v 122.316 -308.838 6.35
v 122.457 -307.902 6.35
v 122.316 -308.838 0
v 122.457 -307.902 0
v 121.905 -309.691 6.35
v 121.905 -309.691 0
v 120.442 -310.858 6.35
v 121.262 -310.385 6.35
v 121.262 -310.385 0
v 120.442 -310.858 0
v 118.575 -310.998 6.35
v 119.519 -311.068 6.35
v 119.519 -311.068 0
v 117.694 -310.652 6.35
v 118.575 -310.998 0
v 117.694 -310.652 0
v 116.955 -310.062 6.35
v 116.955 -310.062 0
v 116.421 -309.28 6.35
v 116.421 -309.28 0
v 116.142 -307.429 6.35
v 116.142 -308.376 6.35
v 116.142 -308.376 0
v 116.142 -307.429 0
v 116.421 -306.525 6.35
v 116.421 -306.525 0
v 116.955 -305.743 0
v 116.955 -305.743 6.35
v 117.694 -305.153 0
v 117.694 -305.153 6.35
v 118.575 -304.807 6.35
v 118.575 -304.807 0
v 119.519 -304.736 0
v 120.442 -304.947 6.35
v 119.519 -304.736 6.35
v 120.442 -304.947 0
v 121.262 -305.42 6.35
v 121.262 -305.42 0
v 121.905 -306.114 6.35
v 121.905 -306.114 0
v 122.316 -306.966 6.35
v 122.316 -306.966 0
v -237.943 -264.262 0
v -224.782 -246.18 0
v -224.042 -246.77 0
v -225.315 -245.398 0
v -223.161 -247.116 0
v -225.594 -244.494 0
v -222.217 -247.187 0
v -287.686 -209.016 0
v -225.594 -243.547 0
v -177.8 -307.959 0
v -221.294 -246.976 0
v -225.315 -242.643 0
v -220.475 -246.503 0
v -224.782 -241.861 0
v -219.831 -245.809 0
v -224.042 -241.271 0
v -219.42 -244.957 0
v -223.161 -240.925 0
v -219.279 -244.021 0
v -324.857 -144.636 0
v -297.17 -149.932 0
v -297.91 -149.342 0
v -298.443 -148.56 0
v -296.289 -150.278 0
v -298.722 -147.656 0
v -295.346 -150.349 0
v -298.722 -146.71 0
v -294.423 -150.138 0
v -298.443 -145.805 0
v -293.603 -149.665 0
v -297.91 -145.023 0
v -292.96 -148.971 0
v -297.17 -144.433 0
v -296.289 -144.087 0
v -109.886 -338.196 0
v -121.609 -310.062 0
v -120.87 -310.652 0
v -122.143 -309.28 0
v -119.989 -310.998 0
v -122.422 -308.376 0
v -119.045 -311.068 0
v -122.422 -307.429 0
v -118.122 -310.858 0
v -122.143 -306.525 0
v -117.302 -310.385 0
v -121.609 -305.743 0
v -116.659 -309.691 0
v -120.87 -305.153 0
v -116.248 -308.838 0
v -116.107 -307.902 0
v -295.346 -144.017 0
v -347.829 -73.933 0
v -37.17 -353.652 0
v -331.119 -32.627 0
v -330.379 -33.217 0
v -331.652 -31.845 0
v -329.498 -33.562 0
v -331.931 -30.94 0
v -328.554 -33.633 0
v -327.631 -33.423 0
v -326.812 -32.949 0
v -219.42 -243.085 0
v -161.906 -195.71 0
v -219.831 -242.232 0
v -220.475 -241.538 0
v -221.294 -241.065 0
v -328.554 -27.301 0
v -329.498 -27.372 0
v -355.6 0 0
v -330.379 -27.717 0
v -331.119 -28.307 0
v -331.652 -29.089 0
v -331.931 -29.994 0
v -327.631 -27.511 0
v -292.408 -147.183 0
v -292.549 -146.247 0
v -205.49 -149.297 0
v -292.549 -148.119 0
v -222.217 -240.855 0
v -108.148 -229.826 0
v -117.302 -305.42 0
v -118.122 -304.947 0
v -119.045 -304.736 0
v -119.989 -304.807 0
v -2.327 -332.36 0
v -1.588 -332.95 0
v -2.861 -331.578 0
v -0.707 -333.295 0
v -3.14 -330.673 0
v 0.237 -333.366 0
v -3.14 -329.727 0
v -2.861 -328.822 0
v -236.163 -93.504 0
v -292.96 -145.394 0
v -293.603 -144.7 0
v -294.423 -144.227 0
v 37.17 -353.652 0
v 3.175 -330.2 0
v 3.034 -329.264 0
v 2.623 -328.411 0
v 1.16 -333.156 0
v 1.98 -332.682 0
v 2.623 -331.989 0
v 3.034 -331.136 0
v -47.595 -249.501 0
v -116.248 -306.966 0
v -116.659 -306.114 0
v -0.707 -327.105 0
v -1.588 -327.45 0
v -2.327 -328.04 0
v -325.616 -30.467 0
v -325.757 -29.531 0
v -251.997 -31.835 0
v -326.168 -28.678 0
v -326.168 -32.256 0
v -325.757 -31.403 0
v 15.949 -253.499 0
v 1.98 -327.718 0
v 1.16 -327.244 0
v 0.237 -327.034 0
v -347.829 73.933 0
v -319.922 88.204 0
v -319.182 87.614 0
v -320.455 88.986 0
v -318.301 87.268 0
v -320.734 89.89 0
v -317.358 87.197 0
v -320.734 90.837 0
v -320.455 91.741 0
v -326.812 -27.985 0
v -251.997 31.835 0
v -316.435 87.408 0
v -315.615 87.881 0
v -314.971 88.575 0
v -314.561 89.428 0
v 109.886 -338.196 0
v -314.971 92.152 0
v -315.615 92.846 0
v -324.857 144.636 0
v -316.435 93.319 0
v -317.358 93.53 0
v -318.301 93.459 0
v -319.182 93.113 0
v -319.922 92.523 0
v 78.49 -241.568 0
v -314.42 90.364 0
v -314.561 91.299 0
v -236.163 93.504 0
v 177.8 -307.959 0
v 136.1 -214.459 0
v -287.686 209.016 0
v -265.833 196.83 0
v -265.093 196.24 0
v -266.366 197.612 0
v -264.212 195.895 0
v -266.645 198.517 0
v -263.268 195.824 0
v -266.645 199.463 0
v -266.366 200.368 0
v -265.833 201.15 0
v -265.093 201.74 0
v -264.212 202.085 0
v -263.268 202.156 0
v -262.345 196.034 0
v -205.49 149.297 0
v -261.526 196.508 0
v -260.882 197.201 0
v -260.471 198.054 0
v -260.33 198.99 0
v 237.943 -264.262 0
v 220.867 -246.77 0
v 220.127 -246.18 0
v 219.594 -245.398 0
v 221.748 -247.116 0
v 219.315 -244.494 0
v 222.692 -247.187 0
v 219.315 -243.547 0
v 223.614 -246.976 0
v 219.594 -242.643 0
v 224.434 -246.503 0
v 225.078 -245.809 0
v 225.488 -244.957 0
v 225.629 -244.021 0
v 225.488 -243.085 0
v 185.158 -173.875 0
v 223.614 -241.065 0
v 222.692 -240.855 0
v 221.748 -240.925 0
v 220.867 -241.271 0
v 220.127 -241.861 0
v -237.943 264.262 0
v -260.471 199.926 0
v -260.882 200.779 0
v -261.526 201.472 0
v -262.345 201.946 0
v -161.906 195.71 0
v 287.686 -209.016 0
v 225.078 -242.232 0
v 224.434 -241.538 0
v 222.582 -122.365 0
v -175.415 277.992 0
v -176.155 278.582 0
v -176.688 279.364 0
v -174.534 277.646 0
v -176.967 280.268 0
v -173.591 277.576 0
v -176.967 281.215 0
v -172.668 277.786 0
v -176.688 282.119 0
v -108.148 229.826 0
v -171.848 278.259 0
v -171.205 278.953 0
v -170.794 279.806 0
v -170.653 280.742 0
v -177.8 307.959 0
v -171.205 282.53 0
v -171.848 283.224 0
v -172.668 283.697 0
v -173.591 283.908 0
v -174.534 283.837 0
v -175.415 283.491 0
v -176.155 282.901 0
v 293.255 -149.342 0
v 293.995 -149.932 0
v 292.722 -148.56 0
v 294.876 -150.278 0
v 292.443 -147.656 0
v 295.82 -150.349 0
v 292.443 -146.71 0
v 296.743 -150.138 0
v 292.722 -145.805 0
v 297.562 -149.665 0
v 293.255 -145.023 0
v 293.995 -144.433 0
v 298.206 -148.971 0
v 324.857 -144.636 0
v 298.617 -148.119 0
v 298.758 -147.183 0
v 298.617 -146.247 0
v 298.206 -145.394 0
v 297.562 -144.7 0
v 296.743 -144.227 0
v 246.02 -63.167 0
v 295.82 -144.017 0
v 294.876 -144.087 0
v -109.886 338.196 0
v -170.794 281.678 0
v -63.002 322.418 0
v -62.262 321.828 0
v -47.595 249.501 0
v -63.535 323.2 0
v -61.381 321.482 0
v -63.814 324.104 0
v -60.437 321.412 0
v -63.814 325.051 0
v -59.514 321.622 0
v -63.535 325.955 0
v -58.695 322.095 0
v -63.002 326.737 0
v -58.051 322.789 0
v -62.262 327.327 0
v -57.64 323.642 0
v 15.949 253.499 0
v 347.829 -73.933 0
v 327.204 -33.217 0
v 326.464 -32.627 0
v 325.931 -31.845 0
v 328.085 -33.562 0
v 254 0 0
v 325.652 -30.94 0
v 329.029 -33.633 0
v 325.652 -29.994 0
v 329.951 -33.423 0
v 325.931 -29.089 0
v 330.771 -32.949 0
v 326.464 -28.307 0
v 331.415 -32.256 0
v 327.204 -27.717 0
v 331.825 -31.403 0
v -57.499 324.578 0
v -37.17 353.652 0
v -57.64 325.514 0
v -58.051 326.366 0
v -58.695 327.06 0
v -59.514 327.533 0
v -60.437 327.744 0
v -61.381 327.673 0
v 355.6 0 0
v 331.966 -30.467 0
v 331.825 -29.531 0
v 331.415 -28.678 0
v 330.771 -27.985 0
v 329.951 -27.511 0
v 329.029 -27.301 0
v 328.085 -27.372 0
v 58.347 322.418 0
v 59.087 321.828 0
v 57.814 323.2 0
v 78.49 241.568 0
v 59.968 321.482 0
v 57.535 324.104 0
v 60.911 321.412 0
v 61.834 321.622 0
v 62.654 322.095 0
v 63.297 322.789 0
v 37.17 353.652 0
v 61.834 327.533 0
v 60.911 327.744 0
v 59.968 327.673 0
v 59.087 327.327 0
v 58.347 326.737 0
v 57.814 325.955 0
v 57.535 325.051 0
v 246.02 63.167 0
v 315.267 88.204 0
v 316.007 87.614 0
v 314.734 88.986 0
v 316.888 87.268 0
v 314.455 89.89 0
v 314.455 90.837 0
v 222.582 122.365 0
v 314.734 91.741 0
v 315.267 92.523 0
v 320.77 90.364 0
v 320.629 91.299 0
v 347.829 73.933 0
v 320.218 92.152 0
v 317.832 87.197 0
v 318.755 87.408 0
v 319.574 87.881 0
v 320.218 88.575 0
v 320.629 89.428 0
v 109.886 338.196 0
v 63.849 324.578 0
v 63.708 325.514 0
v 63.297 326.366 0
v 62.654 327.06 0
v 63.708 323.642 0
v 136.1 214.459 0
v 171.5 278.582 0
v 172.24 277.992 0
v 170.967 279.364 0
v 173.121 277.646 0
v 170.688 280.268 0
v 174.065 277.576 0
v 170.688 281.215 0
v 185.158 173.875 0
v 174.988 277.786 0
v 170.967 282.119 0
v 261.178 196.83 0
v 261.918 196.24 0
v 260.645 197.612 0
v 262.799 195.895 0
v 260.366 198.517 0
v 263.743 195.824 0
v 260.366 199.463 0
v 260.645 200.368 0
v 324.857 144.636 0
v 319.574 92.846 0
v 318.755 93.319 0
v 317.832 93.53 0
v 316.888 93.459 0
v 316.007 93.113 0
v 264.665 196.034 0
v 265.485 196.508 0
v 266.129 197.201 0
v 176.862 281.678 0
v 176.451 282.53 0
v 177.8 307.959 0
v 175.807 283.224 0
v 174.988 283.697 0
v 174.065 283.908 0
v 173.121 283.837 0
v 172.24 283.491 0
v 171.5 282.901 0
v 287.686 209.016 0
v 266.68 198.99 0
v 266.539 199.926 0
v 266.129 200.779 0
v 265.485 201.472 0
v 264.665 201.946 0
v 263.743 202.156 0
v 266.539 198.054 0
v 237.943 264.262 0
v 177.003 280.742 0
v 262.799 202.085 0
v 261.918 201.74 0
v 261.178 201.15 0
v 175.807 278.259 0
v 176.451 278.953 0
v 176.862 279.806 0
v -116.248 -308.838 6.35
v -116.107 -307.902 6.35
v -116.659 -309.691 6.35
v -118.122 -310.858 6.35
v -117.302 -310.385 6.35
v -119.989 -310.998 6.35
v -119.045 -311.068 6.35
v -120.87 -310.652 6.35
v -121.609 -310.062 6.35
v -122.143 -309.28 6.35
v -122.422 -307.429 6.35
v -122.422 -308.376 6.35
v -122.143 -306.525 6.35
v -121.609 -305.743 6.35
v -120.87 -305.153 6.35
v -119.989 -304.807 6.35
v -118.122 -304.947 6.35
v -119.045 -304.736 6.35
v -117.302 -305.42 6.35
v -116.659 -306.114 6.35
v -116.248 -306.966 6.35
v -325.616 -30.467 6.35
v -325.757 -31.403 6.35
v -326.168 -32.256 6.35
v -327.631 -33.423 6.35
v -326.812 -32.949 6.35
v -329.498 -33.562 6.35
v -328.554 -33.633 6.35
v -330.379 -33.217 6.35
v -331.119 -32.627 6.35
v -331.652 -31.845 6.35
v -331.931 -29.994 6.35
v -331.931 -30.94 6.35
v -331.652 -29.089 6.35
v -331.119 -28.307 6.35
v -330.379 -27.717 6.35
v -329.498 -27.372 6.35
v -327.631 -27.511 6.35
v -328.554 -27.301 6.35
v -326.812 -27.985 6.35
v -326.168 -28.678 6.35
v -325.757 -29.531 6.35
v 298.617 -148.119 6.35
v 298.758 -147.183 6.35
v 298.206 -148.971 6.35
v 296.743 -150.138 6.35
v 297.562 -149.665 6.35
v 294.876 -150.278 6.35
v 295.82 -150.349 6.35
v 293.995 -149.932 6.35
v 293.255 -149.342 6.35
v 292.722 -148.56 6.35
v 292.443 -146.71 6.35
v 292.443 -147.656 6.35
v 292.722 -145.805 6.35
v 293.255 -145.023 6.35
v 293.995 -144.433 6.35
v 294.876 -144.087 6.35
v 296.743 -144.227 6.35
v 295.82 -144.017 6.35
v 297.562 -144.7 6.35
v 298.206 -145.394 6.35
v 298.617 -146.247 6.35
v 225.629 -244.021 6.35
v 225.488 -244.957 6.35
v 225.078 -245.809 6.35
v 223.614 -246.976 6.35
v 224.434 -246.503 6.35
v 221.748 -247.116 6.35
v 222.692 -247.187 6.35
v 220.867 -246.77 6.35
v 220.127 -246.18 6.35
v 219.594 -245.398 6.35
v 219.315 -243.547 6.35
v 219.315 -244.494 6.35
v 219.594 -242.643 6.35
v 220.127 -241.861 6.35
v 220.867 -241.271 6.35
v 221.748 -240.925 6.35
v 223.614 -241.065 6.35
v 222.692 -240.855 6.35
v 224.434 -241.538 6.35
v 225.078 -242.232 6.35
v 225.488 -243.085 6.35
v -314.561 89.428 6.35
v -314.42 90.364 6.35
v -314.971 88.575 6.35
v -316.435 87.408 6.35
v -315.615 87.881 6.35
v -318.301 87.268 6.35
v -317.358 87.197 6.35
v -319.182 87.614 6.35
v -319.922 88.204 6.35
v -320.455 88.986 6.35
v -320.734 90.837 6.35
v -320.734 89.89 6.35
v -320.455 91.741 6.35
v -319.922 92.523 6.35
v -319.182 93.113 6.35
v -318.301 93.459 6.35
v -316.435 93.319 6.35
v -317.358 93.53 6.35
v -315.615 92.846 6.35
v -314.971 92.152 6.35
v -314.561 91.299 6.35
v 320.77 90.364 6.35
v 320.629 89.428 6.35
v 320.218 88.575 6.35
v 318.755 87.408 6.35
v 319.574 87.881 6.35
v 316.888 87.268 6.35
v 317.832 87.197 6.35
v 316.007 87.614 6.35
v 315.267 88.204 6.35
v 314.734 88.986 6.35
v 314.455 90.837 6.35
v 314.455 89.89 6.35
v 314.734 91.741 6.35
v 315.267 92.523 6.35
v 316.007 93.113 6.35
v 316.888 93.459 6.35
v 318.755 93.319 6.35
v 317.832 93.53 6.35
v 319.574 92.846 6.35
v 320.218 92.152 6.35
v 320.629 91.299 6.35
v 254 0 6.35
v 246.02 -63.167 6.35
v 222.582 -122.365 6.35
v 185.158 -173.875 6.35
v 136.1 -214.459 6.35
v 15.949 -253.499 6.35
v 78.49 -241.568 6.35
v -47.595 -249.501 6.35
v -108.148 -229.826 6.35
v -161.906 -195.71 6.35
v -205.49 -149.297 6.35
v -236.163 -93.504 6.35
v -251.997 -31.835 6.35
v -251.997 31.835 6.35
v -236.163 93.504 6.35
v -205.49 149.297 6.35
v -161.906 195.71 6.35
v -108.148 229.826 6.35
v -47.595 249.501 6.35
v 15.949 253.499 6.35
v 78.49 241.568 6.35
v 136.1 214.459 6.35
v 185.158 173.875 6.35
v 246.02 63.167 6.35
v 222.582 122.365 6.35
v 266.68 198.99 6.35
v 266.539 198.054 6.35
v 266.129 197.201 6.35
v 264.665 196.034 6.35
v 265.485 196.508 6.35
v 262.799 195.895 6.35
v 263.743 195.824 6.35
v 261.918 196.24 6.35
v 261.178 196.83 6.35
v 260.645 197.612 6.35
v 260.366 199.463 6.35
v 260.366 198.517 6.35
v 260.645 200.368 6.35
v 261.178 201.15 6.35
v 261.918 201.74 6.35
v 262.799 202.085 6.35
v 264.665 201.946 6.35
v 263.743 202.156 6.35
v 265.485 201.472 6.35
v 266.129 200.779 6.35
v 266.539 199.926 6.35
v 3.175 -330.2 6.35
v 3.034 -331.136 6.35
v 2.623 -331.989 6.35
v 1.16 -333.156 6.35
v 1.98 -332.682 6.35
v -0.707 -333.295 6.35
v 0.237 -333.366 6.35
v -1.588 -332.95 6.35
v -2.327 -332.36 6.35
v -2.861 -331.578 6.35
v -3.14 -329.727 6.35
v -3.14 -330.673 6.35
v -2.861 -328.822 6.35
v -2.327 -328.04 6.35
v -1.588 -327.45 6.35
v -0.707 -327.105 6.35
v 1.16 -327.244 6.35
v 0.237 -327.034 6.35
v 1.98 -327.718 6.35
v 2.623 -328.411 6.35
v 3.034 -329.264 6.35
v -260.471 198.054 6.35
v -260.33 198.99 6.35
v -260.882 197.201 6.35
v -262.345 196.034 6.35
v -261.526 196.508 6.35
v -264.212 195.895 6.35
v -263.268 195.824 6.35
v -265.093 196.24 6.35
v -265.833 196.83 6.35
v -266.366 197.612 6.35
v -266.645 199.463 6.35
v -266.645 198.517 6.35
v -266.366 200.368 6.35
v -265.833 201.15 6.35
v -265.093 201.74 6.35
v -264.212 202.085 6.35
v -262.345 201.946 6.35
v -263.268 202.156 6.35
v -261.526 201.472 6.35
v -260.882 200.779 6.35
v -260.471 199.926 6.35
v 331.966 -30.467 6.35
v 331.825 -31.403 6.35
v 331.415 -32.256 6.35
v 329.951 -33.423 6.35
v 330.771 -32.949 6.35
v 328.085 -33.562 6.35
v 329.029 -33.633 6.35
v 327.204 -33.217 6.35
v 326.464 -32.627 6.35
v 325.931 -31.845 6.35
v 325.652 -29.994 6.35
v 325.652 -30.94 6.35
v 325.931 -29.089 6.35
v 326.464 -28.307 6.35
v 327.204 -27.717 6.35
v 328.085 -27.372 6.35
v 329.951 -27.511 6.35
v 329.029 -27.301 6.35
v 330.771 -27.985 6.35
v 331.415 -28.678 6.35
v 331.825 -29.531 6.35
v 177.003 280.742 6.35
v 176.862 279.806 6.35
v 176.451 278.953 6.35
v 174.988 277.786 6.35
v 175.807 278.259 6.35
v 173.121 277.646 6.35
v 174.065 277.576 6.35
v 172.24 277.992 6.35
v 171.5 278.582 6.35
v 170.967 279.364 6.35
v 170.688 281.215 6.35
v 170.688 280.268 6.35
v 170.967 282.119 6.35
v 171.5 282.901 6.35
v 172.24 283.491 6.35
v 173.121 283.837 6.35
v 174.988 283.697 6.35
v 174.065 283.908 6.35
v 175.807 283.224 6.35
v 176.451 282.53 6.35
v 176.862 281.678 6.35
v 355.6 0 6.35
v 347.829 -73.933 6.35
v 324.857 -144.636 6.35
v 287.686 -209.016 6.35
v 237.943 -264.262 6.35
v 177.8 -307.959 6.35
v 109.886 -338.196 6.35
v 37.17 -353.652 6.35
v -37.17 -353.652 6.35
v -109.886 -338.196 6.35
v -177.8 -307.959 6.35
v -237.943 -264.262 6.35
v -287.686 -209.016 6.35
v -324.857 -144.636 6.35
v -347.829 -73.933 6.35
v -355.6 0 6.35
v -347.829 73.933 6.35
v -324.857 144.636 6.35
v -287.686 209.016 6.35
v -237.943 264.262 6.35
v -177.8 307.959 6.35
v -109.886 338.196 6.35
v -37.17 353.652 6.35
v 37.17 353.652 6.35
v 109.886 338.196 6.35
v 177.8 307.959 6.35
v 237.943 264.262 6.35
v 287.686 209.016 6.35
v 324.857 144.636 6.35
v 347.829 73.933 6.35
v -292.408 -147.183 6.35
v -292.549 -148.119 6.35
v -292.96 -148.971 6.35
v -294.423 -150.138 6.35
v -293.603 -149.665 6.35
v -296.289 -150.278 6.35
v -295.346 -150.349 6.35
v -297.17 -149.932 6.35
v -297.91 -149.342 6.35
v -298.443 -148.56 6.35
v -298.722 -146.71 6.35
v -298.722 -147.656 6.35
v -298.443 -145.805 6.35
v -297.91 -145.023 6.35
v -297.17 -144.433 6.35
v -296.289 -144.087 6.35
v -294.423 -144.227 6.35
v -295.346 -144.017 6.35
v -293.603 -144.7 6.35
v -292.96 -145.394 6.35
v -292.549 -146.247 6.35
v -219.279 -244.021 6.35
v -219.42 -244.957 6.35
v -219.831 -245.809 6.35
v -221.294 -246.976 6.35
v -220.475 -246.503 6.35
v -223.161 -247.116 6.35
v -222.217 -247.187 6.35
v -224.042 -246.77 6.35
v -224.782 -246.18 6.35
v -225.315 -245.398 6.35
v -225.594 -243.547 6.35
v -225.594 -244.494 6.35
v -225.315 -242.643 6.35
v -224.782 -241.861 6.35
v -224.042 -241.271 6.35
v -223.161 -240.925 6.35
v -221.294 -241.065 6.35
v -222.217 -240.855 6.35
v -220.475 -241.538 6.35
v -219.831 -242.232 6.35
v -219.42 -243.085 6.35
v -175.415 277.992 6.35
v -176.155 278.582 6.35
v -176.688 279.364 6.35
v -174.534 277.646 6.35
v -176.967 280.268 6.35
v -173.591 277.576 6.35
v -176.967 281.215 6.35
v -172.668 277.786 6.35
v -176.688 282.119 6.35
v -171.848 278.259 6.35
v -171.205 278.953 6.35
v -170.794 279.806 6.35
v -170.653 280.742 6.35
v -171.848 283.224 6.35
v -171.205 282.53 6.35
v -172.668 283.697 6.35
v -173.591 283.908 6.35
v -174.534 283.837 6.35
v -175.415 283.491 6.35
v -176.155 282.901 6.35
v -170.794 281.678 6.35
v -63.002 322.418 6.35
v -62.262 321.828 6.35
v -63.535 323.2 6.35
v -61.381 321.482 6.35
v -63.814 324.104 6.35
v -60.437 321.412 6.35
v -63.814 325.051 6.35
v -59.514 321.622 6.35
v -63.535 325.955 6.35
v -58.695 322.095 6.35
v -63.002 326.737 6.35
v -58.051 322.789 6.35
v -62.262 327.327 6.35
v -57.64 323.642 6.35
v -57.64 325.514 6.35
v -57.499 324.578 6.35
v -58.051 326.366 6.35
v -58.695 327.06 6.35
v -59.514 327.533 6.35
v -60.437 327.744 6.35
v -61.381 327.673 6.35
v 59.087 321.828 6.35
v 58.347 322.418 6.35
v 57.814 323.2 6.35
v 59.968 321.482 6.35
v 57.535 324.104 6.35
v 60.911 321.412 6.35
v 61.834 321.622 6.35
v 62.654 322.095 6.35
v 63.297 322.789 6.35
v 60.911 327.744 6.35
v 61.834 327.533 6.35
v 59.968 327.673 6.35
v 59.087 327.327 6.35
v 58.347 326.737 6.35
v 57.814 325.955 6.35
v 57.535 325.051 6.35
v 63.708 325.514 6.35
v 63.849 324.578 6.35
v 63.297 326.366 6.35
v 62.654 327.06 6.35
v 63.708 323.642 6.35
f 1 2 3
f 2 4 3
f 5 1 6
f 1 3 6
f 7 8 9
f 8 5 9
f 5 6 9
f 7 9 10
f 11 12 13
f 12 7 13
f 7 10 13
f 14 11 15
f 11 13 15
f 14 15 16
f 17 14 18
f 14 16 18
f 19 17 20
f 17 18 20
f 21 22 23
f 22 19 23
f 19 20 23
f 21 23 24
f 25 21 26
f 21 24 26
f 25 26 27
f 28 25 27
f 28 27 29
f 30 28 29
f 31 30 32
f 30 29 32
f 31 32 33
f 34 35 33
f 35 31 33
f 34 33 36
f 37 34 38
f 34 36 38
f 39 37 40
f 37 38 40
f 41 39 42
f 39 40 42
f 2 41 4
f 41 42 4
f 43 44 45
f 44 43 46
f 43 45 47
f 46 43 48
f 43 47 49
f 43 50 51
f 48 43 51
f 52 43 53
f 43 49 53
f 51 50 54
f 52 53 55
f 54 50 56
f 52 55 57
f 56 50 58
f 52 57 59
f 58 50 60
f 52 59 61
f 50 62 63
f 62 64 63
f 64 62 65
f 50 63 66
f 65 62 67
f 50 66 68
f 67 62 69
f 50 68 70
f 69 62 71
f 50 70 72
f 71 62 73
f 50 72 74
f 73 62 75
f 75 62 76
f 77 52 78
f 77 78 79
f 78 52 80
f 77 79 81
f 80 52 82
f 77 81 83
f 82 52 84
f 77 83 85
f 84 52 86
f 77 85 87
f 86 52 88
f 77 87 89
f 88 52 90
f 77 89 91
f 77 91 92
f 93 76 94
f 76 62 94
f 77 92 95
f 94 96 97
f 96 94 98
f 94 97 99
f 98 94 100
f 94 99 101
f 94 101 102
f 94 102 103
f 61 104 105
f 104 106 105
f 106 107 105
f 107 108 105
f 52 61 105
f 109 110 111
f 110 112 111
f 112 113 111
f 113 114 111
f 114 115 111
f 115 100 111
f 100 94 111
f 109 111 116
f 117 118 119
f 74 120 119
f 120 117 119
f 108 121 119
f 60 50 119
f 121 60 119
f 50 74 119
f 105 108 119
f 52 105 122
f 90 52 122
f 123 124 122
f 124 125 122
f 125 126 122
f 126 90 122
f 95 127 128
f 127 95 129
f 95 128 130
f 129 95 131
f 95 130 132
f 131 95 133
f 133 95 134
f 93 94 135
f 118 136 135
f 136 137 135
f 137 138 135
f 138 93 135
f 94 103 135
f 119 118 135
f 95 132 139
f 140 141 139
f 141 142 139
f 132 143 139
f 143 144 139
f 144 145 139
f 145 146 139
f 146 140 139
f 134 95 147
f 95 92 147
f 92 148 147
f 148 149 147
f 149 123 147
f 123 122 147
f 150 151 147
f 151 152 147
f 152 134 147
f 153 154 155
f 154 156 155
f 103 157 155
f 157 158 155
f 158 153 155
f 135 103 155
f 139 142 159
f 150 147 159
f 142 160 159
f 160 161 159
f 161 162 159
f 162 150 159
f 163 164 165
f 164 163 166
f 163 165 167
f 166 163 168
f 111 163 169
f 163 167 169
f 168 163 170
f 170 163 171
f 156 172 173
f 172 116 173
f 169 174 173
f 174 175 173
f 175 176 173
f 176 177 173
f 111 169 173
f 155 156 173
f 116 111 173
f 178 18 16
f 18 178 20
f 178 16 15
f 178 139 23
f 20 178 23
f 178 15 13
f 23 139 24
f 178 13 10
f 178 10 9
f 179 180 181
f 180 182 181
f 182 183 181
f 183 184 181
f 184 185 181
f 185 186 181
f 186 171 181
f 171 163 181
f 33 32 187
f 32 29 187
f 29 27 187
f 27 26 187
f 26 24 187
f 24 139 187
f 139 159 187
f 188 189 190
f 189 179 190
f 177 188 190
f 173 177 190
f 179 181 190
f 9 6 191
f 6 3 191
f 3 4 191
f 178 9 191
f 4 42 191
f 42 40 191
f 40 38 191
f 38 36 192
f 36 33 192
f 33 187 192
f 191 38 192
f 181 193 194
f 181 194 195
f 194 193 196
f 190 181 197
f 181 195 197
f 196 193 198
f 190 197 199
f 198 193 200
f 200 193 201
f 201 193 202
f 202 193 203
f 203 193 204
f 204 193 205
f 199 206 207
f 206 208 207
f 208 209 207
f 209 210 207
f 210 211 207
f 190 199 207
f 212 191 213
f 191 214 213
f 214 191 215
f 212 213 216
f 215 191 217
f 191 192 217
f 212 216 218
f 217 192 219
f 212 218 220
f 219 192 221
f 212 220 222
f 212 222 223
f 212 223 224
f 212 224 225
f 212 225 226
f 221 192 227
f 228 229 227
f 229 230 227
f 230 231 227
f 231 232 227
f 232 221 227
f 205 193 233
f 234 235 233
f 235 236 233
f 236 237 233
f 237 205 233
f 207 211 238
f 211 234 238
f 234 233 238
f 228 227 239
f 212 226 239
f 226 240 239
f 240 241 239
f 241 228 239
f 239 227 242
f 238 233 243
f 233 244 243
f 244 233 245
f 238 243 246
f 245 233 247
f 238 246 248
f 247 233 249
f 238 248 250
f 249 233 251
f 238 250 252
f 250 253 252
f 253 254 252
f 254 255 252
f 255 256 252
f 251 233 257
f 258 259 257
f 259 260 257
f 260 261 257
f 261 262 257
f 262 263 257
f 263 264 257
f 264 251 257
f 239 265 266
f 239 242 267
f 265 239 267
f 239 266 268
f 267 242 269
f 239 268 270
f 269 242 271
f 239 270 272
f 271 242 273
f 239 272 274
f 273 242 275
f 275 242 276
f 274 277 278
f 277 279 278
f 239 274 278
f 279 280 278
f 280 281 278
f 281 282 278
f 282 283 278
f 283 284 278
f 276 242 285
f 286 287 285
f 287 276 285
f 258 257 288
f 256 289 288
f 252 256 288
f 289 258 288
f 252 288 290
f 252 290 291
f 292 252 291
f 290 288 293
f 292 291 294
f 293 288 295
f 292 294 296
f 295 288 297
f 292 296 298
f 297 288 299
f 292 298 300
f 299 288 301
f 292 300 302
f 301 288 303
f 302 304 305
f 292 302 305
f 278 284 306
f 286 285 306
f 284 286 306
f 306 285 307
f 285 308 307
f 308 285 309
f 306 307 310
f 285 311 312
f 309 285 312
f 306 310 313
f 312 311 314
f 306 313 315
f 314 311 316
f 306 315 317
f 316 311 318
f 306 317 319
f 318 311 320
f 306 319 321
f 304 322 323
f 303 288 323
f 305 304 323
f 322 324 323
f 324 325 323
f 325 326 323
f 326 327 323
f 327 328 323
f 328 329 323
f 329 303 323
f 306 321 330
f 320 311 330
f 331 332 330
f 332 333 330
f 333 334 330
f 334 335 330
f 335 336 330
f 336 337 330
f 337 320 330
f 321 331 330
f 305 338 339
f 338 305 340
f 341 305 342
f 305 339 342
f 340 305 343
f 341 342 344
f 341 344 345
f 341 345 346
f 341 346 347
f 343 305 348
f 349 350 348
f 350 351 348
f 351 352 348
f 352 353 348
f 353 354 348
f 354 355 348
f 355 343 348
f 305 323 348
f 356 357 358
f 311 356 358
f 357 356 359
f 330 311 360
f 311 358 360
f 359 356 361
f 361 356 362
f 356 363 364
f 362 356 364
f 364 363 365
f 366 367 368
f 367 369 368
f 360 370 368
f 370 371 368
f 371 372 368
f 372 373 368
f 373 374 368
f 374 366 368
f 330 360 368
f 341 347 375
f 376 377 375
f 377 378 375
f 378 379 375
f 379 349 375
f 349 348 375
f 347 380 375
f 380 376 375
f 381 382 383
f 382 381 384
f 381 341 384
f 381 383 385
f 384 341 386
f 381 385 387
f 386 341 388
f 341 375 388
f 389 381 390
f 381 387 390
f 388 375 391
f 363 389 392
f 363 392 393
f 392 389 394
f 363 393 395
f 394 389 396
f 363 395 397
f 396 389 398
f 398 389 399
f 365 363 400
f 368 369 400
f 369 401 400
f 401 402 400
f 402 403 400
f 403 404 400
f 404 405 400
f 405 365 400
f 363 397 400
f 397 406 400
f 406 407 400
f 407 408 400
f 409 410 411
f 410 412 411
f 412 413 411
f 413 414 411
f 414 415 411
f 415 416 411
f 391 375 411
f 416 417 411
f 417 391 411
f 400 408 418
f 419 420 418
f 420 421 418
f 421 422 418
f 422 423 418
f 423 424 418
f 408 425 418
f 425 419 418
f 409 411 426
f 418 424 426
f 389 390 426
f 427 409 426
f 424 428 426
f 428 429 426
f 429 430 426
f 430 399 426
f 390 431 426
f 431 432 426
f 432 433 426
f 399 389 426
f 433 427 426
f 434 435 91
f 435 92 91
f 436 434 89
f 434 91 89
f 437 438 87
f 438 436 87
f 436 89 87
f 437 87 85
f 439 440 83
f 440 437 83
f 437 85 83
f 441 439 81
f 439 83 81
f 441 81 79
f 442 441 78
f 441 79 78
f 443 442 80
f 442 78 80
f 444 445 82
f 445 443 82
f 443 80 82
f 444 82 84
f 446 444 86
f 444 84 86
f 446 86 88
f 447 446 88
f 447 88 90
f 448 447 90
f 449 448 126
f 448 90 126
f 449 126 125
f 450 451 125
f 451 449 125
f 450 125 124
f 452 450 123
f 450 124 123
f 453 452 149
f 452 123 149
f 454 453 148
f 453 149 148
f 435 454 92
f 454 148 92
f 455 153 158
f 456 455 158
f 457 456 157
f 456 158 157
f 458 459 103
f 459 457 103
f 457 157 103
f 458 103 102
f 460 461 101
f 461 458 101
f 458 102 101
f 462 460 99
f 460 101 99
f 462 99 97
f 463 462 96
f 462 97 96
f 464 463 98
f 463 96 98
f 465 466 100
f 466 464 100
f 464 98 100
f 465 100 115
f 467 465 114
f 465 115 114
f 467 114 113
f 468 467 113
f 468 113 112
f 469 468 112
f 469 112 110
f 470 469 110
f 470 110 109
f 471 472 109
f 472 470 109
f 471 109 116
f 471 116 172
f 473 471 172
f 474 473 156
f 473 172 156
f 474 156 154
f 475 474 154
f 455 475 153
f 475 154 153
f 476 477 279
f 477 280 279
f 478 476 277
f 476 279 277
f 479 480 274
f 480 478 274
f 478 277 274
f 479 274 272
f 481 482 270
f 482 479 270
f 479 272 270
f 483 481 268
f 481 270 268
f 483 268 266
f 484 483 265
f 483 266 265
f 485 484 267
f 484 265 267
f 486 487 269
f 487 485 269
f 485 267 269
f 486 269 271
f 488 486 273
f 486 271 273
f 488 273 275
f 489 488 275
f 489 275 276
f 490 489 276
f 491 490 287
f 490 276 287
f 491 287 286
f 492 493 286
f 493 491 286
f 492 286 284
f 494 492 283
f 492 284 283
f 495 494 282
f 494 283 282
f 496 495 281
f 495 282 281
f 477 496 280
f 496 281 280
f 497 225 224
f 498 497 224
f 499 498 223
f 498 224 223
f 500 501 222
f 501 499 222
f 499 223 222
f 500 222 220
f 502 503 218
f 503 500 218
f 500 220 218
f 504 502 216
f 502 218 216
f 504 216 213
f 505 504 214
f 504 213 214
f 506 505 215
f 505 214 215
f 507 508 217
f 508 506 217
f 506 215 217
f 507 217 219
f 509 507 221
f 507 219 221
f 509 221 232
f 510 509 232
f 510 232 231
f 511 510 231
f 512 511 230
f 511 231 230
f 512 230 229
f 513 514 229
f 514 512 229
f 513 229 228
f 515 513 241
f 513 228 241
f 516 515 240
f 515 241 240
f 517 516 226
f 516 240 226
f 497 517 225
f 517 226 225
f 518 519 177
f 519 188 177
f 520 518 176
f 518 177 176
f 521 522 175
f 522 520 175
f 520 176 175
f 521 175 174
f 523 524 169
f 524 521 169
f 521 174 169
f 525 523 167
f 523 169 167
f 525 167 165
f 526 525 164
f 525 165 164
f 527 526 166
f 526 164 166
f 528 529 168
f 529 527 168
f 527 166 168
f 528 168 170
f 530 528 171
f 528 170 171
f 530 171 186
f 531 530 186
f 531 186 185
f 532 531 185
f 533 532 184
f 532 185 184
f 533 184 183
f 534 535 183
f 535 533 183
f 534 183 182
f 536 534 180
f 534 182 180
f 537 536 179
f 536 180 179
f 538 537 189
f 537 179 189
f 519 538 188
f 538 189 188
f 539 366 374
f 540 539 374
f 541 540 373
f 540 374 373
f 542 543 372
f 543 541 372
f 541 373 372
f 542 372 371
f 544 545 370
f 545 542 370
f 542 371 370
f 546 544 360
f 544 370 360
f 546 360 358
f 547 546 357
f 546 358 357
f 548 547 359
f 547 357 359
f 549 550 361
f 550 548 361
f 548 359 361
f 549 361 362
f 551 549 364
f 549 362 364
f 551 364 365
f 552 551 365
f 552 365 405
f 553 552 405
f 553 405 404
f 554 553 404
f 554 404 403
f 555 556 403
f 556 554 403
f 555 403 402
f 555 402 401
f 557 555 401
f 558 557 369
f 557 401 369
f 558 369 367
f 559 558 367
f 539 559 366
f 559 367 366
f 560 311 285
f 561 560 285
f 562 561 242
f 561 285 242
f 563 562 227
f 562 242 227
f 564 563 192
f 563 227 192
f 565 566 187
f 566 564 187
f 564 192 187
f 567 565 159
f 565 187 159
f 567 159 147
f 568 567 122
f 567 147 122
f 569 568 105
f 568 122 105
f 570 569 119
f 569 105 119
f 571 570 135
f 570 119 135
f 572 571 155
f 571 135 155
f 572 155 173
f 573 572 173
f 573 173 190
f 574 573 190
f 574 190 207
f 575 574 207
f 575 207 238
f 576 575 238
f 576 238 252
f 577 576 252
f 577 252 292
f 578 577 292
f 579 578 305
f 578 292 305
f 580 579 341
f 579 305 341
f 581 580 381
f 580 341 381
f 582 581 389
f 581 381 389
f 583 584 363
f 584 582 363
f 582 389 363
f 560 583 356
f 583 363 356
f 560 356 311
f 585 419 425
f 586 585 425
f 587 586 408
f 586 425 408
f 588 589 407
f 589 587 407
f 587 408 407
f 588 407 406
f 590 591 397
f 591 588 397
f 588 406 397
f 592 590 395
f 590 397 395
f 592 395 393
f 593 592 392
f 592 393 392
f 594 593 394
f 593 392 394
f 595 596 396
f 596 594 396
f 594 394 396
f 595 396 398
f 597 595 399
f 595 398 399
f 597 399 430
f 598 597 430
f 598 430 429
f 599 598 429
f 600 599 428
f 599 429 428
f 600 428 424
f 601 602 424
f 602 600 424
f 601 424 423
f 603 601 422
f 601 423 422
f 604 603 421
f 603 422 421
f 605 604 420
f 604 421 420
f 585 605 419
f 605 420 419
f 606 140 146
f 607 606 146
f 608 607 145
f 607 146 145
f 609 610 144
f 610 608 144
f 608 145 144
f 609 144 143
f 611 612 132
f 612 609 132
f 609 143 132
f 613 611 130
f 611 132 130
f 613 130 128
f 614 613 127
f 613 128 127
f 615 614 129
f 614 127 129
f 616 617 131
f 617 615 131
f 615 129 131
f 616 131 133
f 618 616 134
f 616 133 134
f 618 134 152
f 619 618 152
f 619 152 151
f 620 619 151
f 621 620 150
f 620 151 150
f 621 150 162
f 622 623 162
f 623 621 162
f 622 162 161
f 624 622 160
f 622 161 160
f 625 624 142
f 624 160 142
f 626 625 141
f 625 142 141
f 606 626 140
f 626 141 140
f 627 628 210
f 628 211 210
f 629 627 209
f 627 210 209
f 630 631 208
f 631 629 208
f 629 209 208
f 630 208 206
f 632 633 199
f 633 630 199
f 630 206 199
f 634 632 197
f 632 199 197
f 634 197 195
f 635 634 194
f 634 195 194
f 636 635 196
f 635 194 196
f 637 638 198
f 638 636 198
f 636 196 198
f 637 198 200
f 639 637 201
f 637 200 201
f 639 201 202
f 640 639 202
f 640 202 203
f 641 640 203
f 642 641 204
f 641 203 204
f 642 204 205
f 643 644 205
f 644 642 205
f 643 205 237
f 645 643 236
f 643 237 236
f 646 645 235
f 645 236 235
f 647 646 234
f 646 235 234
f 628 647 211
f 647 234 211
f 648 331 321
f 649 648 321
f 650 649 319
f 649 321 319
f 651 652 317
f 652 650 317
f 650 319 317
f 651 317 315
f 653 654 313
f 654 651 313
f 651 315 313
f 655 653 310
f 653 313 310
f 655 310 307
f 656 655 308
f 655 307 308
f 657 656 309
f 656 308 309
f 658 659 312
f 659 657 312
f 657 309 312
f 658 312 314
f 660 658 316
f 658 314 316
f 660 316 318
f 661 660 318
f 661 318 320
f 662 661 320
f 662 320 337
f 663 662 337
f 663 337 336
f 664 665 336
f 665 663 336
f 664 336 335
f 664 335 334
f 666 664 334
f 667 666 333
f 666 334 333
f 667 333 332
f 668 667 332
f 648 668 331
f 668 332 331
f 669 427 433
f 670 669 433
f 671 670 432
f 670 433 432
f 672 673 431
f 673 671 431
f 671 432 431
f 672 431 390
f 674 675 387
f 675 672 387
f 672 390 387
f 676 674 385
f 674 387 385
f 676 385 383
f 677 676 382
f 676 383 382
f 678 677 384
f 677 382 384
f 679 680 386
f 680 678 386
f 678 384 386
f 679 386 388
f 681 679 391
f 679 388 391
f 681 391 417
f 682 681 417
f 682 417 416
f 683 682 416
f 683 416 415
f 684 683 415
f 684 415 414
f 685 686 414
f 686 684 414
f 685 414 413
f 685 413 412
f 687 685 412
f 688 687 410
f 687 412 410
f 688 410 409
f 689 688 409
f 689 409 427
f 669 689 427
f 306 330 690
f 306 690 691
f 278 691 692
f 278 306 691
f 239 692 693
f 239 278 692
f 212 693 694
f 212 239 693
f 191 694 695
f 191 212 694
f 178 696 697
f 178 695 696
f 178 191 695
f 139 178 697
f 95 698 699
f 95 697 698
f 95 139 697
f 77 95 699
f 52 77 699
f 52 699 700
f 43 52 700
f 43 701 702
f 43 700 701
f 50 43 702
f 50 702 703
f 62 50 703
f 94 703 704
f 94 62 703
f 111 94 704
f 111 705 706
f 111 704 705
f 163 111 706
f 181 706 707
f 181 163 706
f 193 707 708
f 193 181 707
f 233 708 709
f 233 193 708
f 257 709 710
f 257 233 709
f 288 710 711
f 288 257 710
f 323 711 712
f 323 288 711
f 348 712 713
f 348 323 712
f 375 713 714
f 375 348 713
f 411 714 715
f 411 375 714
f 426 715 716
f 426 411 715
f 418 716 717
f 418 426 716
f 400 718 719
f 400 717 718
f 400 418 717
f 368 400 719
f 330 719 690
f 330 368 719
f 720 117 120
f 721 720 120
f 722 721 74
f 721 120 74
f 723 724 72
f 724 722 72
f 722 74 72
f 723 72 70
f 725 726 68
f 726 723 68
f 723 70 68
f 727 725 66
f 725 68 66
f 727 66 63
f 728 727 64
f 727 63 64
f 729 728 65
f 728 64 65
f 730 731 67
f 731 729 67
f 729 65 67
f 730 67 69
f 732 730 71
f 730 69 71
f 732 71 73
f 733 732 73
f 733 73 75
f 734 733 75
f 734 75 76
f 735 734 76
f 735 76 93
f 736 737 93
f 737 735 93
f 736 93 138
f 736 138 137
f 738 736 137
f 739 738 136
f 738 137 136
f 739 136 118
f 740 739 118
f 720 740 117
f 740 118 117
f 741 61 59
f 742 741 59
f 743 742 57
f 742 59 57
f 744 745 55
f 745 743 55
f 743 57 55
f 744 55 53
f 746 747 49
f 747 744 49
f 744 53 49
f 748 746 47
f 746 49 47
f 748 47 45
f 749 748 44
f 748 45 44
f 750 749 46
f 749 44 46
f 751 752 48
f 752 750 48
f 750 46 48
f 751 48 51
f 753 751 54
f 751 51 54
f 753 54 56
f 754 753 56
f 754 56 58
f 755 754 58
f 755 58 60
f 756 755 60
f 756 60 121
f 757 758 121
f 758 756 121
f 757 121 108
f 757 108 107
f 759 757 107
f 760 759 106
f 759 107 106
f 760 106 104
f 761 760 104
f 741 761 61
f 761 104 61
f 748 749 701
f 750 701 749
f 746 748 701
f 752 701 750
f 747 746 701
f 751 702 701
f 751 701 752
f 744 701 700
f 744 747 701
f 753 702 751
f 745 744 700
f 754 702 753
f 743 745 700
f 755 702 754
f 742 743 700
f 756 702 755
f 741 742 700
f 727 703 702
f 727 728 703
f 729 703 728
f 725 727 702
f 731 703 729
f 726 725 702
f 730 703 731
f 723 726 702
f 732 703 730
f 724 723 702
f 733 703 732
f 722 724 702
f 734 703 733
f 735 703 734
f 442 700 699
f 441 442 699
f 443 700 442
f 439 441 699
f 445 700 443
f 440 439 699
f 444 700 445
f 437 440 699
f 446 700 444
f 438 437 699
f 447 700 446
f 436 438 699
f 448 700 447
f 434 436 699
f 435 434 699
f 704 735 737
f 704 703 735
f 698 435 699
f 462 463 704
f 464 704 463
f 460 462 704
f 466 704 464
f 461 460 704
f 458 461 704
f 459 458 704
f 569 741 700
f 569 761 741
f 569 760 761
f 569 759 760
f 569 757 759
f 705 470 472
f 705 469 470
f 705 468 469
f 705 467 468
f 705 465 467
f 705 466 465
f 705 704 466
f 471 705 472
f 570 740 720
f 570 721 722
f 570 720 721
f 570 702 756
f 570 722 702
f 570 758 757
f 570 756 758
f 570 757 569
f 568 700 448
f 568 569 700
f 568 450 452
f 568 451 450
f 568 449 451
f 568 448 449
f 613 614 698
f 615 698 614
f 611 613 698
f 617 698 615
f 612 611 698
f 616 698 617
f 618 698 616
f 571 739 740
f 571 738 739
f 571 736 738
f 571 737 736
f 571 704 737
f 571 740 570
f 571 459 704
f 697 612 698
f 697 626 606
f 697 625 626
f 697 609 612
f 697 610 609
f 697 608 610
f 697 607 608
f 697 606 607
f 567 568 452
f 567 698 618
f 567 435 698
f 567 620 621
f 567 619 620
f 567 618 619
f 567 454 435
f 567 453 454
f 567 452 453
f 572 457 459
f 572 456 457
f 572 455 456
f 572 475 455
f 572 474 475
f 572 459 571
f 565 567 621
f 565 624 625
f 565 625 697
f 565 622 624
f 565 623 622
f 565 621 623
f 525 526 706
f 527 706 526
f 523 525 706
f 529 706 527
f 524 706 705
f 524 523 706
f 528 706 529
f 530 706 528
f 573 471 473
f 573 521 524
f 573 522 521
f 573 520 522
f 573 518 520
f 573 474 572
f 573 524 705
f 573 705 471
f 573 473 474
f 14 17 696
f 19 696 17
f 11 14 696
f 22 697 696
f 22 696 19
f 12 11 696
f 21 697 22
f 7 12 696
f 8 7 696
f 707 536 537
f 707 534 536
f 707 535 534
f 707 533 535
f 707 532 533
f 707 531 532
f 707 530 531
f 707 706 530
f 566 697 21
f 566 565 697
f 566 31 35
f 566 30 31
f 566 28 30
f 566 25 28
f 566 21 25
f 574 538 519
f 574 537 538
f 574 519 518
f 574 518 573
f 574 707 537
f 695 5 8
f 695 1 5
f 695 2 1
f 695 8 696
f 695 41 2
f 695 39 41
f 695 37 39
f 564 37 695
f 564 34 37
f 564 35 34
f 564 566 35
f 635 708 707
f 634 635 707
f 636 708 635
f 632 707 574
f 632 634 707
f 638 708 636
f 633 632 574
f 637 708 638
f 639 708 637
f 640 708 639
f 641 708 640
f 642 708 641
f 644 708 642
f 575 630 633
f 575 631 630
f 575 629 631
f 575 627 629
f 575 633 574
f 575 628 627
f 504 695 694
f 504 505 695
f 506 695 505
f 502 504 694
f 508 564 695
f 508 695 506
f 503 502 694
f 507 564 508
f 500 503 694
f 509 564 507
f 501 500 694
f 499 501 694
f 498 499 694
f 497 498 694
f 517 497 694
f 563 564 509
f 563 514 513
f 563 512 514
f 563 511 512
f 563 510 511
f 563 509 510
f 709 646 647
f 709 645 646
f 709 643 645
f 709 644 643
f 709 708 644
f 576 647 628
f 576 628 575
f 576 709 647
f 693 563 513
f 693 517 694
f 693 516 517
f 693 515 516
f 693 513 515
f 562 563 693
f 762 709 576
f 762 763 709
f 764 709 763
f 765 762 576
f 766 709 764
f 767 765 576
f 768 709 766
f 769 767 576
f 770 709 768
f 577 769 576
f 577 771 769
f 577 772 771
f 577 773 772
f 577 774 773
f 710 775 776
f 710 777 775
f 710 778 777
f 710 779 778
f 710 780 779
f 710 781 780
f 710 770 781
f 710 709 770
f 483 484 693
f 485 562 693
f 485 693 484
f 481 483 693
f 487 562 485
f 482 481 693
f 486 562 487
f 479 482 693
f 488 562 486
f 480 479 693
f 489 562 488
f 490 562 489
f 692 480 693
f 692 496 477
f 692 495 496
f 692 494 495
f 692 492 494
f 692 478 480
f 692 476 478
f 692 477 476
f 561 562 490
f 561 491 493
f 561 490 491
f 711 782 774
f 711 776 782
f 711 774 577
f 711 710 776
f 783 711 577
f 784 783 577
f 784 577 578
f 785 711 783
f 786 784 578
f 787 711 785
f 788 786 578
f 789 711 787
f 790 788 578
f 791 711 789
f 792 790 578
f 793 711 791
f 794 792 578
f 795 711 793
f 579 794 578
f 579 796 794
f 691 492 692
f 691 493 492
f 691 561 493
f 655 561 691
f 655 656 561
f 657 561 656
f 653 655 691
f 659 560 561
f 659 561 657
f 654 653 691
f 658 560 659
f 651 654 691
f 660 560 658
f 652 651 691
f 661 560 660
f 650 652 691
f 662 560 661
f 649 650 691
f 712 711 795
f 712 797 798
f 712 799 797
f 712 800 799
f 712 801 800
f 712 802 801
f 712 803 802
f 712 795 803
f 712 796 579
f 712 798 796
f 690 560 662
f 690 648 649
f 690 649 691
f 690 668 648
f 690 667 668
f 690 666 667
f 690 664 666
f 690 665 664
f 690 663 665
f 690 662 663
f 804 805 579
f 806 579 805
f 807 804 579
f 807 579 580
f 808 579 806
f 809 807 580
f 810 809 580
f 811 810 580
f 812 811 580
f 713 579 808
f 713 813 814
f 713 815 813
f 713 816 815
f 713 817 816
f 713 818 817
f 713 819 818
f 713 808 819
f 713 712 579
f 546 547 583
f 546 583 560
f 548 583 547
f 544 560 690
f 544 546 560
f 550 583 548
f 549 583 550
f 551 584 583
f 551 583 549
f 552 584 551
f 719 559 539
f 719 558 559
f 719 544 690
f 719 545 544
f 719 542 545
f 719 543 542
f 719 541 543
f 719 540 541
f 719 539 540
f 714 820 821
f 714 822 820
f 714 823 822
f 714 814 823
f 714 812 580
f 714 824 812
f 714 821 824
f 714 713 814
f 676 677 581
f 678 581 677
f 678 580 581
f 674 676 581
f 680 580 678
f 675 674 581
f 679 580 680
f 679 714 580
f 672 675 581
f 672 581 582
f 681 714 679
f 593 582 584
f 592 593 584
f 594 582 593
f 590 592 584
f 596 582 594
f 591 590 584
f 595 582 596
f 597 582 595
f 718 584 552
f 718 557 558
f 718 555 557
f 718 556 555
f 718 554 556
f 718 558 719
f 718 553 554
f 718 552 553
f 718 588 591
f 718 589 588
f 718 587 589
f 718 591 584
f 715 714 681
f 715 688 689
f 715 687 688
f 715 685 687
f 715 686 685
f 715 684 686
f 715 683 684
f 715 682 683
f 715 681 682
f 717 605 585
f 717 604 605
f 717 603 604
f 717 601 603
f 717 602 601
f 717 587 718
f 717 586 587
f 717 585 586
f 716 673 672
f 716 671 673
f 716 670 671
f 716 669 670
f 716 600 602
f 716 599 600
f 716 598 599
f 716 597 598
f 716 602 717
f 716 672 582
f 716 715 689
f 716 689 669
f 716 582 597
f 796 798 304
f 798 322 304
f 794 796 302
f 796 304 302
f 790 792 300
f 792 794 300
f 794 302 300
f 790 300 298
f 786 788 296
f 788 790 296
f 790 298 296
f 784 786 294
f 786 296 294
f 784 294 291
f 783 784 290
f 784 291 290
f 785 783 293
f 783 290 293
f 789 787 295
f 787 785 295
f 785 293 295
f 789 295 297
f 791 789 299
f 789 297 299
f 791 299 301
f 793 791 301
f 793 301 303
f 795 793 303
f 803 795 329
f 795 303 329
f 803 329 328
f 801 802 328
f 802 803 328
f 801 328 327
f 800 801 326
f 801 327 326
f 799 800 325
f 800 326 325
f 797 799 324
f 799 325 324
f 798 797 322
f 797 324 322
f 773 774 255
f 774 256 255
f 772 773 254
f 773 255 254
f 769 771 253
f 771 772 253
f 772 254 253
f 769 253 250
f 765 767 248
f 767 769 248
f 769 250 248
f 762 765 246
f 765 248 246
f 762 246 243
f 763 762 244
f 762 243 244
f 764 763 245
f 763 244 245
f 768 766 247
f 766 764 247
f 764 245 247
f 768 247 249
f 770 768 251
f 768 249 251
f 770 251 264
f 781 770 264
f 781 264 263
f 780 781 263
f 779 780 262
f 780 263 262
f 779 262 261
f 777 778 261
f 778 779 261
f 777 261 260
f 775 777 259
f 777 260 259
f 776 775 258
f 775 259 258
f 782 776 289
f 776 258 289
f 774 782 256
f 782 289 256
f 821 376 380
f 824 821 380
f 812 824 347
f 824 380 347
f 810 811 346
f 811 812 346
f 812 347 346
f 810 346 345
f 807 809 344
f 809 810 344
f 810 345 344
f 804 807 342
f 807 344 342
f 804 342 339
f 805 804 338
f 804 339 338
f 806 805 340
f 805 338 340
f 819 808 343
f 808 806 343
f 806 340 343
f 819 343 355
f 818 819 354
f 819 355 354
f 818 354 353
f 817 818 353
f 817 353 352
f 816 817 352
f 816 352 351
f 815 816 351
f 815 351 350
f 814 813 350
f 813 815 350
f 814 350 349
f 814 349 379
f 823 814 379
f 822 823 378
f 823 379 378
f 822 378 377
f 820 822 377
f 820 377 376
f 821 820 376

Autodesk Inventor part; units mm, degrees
ref_plane "YZ Plane" through (0, 0, 0) normal (1, 0, 0) x (0, 1, 0)
ref_plane "XZ Plane" through (0, 0, 0) normal (0, 1, 0) x (-1, 0, 0)
ref_plane "XY Plane" through (0, 0, 0) normal (0, 0, 1) x (1, 0, 0)
sketch "Sketch1" plane through (0, 0, 0) normal (0, 0, 1) x (1, 0, 0)
  circle A0 centre (0, 0) radius 355.6
  circle A1 centre (0, 0) radius 254
  circle A2 centre (0, -330.2) radius 3.175
  circle A3 centre (119.282, -307.9023) radius 3.175
  circle A4 centre (222.4543, -244.0207) radius 3.175
  circle A5 centre (295.5829, -147.1828) radius 3.175
  circle A6 centre (328.7914, -30.467) radius 3.175
  circle A7 centre (317.5948, 90.3635) radius 3.175
  circle A8 centre (263.5053, 198.99) radius 3.175
  circle A9 centre (173.8279, 280.7417) radius 3.175
  circle A10 centre (60.6741, 324.5777) radius 3.175
  circle A11 centre (-60.6741, 324.5777) radius 3.175
  circle A12 centre (-173.8279, 280.7417) radius 3.175
  circle A13 centre (-263.5053, 198.99) radius 3.175
  circle A14 centre (-317.5948, 90.3635) radius 3.175
  circle A15 centre (-328.7914, -30.467) radius 3.175
  circle A16 centre (-295.5829, -147.1828) radius 3.175
  circle A17 centre (-222.4543, -244.0207) radius 3.175
  circle A18 centre (-119.282, -307.9023) radius 3.175
  dimension "d0" = 711.2
  dimension "d1" = 508
  dimension "d3" = 6.35
  dimension "d6" = 360
extrude "Extrusion1" add sketch "Sketch1" along normal blind 6.35
properties part number "back layer of front"
